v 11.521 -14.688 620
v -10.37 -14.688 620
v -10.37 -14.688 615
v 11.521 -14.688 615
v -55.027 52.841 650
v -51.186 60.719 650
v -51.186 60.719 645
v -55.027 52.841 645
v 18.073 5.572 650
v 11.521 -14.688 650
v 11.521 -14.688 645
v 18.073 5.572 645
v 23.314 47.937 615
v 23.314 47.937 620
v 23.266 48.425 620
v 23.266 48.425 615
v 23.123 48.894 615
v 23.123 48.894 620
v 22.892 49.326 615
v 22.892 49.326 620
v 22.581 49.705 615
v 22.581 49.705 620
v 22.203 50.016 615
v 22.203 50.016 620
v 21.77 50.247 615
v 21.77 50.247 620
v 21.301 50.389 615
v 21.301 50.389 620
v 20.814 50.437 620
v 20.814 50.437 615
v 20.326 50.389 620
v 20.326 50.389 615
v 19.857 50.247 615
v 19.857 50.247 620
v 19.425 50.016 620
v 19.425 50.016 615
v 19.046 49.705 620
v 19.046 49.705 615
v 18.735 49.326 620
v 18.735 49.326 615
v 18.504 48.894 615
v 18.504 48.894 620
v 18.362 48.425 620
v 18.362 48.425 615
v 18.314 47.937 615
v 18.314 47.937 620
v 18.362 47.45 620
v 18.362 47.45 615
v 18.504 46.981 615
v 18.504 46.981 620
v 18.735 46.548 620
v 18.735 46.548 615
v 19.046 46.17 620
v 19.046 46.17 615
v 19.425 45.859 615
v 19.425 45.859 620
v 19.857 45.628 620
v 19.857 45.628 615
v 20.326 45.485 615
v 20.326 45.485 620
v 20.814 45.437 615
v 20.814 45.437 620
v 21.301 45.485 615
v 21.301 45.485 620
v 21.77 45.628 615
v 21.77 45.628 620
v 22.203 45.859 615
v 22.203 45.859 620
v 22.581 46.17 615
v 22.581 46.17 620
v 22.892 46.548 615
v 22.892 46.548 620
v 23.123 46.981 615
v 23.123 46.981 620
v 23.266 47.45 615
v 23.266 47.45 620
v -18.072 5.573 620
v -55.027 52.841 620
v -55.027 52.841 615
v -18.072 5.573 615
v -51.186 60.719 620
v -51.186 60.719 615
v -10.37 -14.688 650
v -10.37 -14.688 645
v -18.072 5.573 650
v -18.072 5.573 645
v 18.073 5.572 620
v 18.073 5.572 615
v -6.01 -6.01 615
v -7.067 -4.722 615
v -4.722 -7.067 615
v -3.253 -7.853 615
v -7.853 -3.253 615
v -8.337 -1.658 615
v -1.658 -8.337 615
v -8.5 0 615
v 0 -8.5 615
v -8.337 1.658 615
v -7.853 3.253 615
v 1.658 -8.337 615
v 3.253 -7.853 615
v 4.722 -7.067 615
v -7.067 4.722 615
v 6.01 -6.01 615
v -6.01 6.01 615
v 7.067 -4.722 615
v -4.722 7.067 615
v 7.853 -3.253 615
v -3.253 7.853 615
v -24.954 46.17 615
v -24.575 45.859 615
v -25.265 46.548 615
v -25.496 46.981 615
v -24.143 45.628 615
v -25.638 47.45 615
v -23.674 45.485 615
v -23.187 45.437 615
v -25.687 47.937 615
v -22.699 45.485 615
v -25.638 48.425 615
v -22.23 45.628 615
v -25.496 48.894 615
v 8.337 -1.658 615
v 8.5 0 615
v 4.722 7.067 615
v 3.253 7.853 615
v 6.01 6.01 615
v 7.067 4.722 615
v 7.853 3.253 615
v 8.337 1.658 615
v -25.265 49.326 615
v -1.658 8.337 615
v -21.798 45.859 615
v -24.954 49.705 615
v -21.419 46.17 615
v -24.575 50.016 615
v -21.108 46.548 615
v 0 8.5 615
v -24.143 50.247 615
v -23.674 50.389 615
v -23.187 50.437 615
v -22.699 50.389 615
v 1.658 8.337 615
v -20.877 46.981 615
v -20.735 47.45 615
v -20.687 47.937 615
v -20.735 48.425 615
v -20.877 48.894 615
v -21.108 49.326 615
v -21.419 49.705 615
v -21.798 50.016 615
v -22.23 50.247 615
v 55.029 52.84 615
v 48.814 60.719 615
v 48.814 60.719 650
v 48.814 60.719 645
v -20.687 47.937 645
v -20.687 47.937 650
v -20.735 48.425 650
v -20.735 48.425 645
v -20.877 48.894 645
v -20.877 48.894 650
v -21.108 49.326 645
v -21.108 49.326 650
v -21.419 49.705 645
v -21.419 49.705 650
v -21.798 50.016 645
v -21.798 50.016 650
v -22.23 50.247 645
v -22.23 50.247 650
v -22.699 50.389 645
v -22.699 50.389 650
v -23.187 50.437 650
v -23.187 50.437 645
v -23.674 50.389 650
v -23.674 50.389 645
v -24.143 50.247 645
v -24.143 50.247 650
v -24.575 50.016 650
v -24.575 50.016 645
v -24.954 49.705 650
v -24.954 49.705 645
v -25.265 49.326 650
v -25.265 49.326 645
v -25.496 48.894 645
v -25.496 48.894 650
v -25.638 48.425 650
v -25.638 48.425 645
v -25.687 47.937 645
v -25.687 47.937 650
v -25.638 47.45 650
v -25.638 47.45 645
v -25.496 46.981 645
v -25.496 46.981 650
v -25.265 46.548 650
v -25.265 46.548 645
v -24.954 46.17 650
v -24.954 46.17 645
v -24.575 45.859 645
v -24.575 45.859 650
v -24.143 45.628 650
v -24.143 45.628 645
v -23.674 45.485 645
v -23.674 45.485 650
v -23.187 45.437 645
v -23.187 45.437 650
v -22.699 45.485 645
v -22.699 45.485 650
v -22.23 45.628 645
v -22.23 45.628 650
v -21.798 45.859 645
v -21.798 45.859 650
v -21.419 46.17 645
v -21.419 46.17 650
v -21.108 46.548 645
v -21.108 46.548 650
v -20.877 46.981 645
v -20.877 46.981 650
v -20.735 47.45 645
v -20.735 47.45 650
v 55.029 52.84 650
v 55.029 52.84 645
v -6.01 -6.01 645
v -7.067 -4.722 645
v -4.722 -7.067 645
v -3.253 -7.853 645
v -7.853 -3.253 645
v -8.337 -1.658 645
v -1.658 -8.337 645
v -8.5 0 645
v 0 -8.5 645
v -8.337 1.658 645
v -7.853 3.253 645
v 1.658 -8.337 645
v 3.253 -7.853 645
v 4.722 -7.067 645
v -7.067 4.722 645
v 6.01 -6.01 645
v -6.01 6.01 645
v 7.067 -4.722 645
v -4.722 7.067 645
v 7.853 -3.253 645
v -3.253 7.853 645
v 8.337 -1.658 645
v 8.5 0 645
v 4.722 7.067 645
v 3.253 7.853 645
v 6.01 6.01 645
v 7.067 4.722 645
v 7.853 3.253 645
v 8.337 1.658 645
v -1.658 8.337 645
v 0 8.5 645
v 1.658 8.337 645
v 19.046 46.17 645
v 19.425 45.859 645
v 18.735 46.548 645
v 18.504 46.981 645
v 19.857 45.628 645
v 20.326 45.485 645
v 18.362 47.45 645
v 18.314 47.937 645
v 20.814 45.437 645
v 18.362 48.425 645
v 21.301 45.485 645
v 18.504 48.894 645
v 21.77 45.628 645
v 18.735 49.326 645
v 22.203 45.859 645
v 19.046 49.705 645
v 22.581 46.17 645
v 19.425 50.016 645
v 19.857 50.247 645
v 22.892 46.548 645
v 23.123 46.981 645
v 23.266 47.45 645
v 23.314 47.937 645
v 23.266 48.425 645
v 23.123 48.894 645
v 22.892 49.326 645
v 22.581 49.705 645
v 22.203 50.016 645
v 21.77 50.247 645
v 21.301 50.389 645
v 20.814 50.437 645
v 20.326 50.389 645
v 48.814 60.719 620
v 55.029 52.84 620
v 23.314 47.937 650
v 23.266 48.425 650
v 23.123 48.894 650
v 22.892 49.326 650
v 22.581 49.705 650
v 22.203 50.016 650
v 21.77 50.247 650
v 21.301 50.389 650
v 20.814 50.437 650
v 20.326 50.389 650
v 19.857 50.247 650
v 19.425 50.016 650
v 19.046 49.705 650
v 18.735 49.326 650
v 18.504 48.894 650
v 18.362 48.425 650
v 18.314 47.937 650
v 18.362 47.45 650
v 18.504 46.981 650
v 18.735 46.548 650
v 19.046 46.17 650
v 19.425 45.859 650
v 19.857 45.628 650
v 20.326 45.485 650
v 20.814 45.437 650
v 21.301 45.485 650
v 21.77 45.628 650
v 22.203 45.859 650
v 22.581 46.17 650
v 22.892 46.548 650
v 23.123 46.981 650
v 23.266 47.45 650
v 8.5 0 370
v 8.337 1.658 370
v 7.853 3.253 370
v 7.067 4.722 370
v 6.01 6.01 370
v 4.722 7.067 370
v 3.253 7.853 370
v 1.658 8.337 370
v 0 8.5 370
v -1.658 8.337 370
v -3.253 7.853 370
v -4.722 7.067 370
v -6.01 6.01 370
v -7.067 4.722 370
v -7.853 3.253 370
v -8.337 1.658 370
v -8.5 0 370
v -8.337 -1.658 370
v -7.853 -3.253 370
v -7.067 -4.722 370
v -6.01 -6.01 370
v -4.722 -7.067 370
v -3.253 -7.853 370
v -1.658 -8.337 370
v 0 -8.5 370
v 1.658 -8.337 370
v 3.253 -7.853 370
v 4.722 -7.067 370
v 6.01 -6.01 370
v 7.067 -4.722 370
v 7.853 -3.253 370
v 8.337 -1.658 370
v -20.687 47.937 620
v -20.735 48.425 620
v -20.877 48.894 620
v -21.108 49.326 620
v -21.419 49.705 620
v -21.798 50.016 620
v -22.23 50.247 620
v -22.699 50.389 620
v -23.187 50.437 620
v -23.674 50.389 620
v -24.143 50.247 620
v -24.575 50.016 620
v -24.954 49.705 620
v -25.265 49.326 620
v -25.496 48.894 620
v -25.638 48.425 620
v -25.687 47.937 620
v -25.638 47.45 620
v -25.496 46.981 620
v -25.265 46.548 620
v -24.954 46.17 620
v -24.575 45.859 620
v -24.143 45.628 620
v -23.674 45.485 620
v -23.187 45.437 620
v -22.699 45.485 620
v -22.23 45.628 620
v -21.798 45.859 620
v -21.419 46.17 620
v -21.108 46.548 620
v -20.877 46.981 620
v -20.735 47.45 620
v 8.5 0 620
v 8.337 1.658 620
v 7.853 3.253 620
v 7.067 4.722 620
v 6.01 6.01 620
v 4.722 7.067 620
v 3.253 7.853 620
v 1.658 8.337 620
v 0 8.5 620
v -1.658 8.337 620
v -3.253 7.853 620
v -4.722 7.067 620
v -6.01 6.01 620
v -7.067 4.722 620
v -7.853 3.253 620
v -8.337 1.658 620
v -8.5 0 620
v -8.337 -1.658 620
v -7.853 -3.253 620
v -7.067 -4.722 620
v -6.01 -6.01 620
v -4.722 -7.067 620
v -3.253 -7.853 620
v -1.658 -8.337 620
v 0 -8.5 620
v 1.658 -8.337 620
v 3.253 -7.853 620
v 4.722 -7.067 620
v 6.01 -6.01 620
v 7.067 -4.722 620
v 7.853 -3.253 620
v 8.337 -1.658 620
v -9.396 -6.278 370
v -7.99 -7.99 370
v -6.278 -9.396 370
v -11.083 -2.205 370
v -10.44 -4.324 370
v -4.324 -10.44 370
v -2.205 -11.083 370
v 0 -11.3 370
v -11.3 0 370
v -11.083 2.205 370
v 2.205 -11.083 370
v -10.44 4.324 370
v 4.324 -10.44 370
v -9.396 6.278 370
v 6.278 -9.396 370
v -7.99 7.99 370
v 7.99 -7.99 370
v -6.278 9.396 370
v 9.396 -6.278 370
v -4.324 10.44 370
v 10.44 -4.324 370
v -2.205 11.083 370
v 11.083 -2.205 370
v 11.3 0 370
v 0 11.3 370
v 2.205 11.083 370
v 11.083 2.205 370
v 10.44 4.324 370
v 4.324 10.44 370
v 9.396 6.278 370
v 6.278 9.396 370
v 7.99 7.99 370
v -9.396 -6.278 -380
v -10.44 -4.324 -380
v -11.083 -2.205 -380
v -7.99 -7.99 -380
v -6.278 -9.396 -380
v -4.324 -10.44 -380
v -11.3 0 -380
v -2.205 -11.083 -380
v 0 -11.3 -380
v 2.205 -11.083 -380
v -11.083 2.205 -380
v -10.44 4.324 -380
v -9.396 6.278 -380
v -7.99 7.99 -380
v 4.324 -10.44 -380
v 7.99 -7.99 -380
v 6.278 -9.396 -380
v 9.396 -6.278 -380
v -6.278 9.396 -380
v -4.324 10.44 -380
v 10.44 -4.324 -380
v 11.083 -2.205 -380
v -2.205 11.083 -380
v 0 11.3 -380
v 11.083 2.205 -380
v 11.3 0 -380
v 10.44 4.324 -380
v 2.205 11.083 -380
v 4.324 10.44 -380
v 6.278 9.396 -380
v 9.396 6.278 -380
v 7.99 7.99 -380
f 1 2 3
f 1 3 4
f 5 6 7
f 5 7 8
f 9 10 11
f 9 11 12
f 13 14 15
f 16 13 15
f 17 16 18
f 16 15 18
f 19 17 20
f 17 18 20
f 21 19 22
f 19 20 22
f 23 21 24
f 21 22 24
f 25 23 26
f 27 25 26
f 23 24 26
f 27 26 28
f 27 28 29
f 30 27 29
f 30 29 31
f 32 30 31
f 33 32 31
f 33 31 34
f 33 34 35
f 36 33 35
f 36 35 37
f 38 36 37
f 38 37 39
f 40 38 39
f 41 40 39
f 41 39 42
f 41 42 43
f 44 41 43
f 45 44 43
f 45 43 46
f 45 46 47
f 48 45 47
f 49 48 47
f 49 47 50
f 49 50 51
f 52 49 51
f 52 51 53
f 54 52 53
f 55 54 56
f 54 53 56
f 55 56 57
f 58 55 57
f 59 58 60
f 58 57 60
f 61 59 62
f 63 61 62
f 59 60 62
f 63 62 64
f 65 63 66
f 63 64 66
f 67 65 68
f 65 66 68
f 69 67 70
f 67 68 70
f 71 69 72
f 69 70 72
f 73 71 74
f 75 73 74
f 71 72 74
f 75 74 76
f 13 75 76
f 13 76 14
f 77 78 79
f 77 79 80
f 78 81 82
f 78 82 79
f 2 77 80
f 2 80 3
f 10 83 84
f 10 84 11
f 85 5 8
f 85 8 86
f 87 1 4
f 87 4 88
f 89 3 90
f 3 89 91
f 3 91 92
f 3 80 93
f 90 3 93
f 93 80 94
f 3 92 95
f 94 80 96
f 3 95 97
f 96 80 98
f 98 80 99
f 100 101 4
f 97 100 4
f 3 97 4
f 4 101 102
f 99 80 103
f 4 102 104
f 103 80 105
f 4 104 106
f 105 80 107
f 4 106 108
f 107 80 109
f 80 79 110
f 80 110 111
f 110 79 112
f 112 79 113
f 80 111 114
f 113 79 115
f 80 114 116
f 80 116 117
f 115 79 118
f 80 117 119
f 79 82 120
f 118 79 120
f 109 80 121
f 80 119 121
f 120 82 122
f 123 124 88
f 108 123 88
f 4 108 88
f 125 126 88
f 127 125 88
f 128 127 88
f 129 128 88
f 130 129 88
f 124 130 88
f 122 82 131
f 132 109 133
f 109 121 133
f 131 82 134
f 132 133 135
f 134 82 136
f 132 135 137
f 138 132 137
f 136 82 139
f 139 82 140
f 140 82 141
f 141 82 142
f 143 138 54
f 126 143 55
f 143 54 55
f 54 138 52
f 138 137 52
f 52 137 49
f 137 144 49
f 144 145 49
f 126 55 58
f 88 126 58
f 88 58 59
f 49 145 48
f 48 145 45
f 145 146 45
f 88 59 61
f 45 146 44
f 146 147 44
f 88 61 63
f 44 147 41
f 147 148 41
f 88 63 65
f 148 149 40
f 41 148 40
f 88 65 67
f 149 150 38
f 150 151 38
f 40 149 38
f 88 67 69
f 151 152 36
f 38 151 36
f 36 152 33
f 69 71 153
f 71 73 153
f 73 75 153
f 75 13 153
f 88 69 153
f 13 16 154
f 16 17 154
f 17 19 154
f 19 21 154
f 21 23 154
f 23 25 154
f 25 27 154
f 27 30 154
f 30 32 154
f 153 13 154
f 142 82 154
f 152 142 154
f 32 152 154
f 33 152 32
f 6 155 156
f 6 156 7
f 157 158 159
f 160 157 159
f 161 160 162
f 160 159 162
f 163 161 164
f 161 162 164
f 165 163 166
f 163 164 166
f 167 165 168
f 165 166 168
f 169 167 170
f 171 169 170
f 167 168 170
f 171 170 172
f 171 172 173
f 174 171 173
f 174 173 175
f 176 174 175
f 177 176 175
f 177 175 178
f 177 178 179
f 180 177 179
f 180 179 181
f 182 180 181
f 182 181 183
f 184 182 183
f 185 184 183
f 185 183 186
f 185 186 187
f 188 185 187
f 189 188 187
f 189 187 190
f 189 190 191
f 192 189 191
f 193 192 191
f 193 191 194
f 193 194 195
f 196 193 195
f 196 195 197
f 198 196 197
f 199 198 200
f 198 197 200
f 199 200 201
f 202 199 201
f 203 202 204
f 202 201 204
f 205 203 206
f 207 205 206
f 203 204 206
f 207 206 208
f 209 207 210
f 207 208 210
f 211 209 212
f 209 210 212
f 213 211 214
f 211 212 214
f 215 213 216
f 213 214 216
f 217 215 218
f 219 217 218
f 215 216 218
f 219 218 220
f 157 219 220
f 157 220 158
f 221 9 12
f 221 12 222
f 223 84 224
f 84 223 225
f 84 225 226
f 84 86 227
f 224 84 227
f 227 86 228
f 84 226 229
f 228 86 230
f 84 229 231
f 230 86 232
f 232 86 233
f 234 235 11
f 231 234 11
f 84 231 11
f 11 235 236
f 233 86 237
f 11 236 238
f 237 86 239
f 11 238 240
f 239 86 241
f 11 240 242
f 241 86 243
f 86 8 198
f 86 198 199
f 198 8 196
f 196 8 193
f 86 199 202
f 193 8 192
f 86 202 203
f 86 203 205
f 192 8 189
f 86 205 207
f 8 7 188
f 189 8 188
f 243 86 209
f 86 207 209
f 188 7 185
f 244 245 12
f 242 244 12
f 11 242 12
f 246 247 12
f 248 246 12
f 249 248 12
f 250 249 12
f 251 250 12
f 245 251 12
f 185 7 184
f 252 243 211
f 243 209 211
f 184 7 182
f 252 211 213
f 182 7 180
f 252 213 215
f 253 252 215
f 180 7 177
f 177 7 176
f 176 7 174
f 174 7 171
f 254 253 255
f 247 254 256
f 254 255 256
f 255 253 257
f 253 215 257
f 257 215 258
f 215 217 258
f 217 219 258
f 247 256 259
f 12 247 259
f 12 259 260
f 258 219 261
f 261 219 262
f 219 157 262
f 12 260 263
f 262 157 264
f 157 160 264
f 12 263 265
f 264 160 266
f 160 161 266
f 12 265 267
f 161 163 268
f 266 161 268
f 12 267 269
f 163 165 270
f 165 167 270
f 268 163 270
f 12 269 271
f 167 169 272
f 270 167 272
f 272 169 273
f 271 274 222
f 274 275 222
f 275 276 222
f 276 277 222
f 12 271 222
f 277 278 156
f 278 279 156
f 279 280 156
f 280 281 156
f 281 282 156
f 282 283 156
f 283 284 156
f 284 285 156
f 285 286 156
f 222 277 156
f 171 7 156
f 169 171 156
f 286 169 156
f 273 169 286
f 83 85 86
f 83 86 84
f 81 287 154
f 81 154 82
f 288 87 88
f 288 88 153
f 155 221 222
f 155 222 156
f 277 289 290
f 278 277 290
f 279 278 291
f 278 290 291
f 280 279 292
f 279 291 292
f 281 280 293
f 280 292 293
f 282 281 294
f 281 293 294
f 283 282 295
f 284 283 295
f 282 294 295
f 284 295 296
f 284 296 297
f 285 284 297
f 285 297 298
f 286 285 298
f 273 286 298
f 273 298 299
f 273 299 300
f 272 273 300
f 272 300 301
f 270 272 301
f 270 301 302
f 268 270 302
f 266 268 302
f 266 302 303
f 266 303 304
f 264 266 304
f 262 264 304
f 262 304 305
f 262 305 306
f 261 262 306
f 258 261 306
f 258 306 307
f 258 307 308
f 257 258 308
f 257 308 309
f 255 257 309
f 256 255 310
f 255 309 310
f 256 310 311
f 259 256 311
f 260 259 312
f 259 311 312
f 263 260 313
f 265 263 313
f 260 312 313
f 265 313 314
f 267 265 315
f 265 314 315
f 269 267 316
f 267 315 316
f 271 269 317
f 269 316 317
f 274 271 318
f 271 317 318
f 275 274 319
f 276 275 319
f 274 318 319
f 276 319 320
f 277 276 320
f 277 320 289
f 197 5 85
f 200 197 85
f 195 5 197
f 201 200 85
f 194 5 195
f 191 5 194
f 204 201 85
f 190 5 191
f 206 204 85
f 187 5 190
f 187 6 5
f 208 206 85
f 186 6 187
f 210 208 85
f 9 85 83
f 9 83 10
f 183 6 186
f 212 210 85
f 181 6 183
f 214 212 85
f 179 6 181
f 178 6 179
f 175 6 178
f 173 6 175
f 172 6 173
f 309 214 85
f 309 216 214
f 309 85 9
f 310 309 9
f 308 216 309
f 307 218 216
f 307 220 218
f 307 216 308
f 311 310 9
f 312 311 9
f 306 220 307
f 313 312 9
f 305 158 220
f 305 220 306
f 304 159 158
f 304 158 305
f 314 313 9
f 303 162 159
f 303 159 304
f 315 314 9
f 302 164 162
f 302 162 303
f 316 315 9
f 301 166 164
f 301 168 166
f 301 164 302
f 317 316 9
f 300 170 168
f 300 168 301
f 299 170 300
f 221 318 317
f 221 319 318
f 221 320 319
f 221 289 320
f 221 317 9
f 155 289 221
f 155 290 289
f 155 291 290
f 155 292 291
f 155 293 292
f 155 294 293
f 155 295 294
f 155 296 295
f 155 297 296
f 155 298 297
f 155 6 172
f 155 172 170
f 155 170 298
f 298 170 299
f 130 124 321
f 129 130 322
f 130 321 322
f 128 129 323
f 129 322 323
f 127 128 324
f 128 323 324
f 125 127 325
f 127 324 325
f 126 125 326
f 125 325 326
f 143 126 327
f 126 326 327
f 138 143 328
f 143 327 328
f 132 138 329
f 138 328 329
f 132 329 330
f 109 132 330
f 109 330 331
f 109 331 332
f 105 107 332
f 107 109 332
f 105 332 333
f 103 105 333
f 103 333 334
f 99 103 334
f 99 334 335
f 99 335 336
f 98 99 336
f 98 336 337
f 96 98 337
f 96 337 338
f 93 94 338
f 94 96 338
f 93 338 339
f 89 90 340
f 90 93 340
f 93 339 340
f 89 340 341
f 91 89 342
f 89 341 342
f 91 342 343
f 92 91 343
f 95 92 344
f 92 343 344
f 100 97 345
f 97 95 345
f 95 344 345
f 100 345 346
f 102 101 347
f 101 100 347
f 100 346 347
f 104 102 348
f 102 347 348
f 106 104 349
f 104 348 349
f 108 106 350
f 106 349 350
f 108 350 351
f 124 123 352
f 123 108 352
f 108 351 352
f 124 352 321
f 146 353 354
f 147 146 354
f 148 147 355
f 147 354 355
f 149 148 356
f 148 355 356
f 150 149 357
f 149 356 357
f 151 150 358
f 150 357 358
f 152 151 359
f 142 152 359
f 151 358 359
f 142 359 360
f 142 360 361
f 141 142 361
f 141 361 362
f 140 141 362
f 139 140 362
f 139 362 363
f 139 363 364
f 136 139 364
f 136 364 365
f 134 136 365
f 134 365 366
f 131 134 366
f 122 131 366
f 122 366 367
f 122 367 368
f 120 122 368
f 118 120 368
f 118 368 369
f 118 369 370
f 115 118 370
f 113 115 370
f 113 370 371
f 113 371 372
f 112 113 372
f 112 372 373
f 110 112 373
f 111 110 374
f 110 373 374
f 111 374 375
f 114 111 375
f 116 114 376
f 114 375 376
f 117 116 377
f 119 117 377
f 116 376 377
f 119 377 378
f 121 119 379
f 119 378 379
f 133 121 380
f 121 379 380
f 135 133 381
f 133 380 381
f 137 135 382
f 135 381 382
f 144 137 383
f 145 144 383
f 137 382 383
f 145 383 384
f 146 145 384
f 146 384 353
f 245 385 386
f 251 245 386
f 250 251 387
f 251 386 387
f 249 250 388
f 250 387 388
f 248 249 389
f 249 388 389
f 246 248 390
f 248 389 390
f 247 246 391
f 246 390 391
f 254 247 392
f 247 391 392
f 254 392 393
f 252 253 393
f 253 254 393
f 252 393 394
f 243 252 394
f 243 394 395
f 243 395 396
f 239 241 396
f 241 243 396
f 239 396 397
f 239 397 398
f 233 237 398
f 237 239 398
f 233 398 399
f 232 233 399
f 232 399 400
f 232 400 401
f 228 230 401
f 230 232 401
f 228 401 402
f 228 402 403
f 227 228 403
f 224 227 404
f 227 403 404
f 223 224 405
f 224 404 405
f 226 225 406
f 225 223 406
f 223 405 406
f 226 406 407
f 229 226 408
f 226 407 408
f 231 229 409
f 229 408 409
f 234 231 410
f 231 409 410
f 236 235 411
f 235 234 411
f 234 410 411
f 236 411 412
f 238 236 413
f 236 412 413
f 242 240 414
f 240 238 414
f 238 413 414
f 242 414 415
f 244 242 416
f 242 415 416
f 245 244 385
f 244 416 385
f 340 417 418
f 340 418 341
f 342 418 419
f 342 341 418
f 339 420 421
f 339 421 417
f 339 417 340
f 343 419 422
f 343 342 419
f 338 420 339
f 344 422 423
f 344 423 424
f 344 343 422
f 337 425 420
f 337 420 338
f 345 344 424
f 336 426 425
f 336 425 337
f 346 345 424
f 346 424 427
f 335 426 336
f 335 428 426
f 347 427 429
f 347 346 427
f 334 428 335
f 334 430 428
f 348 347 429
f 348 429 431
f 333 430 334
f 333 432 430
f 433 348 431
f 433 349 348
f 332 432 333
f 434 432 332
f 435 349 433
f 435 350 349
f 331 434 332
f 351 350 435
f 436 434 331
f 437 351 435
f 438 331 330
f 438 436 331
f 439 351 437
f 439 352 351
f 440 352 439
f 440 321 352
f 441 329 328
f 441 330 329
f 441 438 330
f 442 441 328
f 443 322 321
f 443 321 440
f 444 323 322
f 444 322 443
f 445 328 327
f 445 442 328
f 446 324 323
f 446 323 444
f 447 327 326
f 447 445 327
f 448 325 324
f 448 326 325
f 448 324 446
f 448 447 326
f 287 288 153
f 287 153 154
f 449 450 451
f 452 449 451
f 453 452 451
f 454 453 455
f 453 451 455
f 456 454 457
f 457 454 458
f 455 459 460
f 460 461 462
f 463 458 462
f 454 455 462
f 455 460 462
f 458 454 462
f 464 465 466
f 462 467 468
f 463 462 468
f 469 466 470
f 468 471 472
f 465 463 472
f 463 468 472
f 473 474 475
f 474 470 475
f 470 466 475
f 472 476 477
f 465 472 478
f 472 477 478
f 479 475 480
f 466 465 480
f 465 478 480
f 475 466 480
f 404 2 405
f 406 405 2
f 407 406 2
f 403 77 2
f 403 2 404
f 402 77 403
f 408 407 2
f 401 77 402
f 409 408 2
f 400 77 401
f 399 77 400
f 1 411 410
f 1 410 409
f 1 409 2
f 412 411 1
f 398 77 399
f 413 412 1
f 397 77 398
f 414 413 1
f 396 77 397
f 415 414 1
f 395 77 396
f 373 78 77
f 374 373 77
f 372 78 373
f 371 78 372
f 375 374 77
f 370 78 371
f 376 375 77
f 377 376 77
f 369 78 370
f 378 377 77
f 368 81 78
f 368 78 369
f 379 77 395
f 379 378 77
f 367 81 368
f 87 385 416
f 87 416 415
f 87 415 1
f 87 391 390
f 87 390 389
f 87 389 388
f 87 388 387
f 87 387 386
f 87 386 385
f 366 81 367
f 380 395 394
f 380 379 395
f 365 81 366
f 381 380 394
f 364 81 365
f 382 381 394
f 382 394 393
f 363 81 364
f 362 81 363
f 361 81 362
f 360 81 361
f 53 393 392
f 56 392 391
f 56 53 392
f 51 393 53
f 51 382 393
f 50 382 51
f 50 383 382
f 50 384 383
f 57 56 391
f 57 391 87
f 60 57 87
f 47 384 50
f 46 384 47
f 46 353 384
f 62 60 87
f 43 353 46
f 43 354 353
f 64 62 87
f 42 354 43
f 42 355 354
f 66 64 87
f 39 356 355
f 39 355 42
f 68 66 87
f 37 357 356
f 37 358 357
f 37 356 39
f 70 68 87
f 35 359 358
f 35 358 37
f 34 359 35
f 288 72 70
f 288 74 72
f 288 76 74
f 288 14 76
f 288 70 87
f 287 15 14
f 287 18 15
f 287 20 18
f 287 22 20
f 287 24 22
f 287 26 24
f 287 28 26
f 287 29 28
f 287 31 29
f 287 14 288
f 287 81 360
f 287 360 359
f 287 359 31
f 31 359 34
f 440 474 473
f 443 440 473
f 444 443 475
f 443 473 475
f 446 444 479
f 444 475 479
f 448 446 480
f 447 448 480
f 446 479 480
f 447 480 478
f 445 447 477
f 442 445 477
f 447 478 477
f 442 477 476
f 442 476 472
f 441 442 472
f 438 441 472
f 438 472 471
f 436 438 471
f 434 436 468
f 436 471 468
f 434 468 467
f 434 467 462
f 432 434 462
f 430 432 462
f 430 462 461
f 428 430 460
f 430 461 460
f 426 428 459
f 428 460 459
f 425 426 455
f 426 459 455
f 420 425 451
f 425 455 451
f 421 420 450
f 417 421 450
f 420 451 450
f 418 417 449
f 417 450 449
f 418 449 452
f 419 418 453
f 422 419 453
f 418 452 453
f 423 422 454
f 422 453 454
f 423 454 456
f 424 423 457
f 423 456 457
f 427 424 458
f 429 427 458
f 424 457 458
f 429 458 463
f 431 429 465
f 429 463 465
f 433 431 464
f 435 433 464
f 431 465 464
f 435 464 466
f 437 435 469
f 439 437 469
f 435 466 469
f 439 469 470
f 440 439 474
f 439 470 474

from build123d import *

# Parameters (mm, degrees)
BOSS_EXTRUDE1_START = -380
SKETCH1_R           = 11.3
BOSS_EXTRUDE1_DEPTH = 750
SKETCH2_R           = 8.5
BOSS_EXTRUDE2_DEPTH = 280
BOSS_EXTRUDE3_DEPTH = 5
LPATTERN1_COUNT     = 2
LPATTERN1_PITCH     = 30
SKETCH6_R           = 2.5
CUT_EXTRUDE1_DEPTH  = 150


with BuildPart() as part:
    # Sketch1 → Boss-Extrude1 (new body)
    with BuildSketch(Plane.XY.offset(BOSS_EXTRUDE1_START)):
        Circle(SKETCH1_R)
    extrude(amount=BOSS_EXTRUDE1_DEPTH)

    # Sketch2 → Boss-Extrude2 (add)
    with BuildSketch(Plane.XY.offset(370)):
        Circle(SKETCH2_R)
    extrude(amount=BOSS_EXTRUDE2_DEPTH)

    # Sketch3 → Boss-Extrude3 (add)
    with BuildSketch(Plane.XY.offset(650)):
        Polygon((11.52115326, -14.68790239), (18.072829237, 5.572294102), (55.029019564, 52.840042055), (48.813565956, 60.718856904), (-51.186434044, 60.718856904), (-55.027164938, 52.840905681), (-18.071550308, 5.572707626), (-10.36978253, -14.68790239), (0, -14.68790239), align=None)
    boss_extrude3 = extrude(amount=-BOSS_EXTRUDE3_DEPTH)

    # LPattern1: Boss-Extrude3 ×2
    with Locations(*[(0, 0, -i * LPATTERN1_PITCH) for i in range(1, LPATTERN1_COUNT)]):
        add(boss_extrude3)

    # Sketch6 → Cut-Extrude1 (cut)
    with BuildSketch(Plane.XY.offset(650)):
        with Locations((-23.186517394, 47.937289654)):
            Circle(SKETCH6_R)
        with Locations((20.813649306, 47.937289654)):
            Circle(SKETCH6_R)
    extrude(amount=-CUT_EXTRUDE1_DEPTH, mode=Mode.SUBTRACT)


solid = part.part
